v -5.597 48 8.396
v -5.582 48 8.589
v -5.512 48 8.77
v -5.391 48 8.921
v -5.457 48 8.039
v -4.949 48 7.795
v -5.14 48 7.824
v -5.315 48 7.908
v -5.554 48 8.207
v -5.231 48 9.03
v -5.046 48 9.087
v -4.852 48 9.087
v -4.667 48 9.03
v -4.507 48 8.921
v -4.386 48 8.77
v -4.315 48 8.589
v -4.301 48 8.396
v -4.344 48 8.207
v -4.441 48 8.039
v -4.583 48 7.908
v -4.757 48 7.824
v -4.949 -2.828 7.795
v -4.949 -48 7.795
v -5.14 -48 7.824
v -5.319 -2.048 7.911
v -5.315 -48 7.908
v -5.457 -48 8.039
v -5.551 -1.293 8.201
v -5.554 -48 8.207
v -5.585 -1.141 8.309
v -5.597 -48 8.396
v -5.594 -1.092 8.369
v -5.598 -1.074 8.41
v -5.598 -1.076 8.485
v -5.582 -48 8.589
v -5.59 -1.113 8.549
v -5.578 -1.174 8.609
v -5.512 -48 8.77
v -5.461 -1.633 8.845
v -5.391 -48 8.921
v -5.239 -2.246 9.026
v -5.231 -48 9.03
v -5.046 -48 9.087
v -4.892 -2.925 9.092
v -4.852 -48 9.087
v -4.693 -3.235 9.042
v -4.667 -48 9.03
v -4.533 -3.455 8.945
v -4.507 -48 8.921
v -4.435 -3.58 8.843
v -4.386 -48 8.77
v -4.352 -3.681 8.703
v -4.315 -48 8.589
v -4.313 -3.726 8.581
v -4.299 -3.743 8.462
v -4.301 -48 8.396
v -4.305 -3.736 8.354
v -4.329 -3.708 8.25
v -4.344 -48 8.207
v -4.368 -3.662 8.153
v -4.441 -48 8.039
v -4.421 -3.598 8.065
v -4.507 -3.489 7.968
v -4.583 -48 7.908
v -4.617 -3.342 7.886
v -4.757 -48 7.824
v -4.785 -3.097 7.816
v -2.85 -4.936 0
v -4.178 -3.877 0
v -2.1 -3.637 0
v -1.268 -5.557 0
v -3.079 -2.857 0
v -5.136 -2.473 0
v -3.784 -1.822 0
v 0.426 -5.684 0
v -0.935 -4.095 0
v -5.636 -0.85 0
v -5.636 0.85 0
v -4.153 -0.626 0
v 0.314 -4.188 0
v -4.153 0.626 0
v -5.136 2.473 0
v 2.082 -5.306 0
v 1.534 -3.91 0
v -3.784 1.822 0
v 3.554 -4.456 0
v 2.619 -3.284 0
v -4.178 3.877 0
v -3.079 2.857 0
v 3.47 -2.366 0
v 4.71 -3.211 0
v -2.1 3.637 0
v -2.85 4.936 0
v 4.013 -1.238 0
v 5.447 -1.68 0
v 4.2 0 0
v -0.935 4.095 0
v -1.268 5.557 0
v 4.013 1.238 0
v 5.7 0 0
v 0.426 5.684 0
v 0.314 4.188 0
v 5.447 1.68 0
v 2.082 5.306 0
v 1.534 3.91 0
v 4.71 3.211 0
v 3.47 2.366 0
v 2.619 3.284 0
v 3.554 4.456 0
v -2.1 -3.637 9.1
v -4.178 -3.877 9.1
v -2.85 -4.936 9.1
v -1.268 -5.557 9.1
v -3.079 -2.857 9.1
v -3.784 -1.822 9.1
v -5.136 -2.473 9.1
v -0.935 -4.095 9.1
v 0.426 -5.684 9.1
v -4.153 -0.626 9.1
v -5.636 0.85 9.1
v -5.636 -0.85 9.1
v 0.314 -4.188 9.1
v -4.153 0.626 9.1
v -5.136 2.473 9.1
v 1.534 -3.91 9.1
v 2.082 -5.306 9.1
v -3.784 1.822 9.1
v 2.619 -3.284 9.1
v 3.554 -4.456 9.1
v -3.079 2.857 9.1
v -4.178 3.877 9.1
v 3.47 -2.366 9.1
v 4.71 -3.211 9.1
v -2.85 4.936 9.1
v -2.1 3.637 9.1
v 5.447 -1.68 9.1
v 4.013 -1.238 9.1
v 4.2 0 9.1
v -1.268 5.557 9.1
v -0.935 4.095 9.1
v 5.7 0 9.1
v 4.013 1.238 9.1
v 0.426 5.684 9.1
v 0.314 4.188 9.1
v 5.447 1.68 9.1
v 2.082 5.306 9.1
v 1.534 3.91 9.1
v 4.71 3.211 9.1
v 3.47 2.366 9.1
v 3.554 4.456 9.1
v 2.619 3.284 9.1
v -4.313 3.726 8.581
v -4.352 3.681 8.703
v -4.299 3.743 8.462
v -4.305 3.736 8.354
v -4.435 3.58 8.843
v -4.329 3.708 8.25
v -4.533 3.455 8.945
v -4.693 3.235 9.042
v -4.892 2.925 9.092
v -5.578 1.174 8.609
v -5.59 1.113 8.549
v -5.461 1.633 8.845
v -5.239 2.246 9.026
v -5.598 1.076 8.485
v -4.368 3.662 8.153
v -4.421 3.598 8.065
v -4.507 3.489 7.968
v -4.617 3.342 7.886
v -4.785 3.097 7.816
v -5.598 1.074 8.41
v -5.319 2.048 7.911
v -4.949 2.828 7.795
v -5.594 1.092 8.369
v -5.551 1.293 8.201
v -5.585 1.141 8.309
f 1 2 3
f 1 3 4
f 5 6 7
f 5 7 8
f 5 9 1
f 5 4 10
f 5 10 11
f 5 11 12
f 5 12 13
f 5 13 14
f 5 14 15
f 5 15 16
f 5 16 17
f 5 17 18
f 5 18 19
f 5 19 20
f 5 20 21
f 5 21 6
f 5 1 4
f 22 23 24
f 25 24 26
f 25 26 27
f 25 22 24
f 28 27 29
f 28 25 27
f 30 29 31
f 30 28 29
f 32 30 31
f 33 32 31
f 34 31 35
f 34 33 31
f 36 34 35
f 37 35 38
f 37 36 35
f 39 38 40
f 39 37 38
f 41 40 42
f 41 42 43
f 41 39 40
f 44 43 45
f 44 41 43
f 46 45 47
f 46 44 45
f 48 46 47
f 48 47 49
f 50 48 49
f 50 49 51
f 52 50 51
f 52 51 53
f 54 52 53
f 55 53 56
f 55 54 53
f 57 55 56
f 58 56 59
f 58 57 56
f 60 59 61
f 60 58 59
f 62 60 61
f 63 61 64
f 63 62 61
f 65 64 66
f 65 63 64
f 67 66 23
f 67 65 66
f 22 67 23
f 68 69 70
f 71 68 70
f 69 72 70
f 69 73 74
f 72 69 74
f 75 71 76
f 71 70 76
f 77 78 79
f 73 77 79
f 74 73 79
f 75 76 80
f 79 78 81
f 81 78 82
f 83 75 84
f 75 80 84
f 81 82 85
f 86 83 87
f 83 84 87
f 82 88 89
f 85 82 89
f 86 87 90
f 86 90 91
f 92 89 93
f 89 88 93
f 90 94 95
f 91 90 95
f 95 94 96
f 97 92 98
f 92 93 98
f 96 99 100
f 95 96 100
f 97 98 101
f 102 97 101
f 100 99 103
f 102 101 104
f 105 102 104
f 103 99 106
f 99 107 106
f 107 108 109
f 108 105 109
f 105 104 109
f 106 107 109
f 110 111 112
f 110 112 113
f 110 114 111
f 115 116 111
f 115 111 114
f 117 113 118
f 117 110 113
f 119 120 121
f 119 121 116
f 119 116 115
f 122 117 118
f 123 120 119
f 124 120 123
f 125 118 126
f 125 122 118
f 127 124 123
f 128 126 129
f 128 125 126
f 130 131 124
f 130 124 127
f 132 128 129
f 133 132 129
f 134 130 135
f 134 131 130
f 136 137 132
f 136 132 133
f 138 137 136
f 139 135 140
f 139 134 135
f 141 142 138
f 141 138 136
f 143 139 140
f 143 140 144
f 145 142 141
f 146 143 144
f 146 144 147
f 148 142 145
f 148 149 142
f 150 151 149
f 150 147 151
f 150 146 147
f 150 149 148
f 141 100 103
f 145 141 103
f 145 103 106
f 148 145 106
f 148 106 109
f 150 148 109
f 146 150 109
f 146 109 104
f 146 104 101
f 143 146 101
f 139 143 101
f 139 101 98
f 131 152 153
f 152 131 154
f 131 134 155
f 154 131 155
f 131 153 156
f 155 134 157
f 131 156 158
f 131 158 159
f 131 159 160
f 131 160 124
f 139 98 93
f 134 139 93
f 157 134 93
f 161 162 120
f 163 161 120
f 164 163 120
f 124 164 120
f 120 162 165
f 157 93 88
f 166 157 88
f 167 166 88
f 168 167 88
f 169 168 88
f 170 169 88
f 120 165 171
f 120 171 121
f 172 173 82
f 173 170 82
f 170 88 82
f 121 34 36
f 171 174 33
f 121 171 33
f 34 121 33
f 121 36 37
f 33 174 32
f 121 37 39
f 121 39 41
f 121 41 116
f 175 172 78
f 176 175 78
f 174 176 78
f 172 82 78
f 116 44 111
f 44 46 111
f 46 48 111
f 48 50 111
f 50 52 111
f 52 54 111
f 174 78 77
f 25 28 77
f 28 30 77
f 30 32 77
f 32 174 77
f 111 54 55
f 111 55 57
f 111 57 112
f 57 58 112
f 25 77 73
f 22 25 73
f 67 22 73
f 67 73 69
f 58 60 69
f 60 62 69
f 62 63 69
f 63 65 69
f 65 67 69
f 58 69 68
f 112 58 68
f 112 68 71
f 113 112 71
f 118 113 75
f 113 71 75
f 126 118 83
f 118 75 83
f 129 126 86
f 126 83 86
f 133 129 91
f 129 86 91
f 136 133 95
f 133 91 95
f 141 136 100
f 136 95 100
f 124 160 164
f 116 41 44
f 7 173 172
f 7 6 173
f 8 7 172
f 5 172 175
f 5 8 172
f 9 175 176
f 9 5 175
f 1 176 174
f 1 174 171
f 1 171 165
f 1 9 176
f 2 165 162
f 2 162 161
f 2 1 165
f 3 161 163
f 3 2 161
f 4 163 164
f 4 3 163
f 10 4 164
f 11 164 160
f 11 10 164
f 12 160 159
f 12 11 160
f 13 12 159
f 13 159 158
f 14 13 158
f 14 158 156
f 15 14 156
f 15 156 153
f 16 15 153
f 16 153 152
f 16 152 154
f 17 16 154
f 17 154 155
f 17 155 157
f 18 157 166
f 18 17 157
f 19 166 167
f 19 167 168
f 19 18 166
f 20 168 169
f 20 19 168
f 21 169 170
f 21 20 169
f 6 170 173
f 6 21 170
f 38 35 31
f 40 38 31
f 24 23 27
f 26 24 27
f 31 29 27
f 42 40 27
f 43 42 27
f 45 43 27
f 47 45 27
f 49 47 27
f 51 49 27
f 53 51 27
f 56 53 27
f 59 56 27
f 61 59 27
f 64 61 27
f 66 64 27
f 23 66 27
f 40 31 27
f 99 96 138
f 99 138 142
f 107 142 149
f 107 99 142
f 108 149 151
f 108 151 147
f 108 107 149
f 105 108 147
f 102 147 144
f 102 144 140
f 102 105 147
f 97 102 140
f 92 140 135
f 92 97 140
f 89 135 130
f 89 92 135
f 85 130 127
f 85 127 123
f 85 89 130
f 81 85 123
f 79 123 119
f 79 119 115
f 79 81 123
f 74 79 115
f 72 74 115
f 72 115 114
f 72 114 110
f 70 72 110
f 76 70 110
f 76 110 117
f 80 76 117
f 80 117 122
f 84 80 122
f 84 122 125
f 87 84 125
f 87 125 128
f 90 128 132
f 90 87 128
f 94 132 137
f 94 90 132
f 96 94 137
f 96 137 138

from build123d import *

# Parameters (mm, degrees)
SKETCH1_R           = 5.7
SKETCH1_R_2         = 4.2
BOSS_EXTRUDE1_DEPTH = 9.1
SKETCH2_R           = 0.65
BOSS_EXTRUDE2_DEPTH = 48


with BuildPart() as part:
    # Sketch1 → Boss-Extrude1 (new body)
    with BuildSketch(Plane.XY):
        Circle(SKETCH1_R)
        Circle(SKETCH1_R_2, mode=Mode.SUBTRACT)
    extrude(amount=BOSS_EXTRUDE1_DEPTH)

    # Sketch2 → Boss-Extrude2 (add, symmetric)
    with BuildSketch(Plane(origin=(0, 0, 0), x_dir=(1, 0, 0), z_dir=(0, 1, 0))):
        with Locations(Location((-4.94879538, -8.44469772, 0), (0, 0, 90))):
            Circle(SKETCH2_R)
    extrude(amount=BOSS_EXTRUDE2_DEPTH, both=True)


solid = part.part
